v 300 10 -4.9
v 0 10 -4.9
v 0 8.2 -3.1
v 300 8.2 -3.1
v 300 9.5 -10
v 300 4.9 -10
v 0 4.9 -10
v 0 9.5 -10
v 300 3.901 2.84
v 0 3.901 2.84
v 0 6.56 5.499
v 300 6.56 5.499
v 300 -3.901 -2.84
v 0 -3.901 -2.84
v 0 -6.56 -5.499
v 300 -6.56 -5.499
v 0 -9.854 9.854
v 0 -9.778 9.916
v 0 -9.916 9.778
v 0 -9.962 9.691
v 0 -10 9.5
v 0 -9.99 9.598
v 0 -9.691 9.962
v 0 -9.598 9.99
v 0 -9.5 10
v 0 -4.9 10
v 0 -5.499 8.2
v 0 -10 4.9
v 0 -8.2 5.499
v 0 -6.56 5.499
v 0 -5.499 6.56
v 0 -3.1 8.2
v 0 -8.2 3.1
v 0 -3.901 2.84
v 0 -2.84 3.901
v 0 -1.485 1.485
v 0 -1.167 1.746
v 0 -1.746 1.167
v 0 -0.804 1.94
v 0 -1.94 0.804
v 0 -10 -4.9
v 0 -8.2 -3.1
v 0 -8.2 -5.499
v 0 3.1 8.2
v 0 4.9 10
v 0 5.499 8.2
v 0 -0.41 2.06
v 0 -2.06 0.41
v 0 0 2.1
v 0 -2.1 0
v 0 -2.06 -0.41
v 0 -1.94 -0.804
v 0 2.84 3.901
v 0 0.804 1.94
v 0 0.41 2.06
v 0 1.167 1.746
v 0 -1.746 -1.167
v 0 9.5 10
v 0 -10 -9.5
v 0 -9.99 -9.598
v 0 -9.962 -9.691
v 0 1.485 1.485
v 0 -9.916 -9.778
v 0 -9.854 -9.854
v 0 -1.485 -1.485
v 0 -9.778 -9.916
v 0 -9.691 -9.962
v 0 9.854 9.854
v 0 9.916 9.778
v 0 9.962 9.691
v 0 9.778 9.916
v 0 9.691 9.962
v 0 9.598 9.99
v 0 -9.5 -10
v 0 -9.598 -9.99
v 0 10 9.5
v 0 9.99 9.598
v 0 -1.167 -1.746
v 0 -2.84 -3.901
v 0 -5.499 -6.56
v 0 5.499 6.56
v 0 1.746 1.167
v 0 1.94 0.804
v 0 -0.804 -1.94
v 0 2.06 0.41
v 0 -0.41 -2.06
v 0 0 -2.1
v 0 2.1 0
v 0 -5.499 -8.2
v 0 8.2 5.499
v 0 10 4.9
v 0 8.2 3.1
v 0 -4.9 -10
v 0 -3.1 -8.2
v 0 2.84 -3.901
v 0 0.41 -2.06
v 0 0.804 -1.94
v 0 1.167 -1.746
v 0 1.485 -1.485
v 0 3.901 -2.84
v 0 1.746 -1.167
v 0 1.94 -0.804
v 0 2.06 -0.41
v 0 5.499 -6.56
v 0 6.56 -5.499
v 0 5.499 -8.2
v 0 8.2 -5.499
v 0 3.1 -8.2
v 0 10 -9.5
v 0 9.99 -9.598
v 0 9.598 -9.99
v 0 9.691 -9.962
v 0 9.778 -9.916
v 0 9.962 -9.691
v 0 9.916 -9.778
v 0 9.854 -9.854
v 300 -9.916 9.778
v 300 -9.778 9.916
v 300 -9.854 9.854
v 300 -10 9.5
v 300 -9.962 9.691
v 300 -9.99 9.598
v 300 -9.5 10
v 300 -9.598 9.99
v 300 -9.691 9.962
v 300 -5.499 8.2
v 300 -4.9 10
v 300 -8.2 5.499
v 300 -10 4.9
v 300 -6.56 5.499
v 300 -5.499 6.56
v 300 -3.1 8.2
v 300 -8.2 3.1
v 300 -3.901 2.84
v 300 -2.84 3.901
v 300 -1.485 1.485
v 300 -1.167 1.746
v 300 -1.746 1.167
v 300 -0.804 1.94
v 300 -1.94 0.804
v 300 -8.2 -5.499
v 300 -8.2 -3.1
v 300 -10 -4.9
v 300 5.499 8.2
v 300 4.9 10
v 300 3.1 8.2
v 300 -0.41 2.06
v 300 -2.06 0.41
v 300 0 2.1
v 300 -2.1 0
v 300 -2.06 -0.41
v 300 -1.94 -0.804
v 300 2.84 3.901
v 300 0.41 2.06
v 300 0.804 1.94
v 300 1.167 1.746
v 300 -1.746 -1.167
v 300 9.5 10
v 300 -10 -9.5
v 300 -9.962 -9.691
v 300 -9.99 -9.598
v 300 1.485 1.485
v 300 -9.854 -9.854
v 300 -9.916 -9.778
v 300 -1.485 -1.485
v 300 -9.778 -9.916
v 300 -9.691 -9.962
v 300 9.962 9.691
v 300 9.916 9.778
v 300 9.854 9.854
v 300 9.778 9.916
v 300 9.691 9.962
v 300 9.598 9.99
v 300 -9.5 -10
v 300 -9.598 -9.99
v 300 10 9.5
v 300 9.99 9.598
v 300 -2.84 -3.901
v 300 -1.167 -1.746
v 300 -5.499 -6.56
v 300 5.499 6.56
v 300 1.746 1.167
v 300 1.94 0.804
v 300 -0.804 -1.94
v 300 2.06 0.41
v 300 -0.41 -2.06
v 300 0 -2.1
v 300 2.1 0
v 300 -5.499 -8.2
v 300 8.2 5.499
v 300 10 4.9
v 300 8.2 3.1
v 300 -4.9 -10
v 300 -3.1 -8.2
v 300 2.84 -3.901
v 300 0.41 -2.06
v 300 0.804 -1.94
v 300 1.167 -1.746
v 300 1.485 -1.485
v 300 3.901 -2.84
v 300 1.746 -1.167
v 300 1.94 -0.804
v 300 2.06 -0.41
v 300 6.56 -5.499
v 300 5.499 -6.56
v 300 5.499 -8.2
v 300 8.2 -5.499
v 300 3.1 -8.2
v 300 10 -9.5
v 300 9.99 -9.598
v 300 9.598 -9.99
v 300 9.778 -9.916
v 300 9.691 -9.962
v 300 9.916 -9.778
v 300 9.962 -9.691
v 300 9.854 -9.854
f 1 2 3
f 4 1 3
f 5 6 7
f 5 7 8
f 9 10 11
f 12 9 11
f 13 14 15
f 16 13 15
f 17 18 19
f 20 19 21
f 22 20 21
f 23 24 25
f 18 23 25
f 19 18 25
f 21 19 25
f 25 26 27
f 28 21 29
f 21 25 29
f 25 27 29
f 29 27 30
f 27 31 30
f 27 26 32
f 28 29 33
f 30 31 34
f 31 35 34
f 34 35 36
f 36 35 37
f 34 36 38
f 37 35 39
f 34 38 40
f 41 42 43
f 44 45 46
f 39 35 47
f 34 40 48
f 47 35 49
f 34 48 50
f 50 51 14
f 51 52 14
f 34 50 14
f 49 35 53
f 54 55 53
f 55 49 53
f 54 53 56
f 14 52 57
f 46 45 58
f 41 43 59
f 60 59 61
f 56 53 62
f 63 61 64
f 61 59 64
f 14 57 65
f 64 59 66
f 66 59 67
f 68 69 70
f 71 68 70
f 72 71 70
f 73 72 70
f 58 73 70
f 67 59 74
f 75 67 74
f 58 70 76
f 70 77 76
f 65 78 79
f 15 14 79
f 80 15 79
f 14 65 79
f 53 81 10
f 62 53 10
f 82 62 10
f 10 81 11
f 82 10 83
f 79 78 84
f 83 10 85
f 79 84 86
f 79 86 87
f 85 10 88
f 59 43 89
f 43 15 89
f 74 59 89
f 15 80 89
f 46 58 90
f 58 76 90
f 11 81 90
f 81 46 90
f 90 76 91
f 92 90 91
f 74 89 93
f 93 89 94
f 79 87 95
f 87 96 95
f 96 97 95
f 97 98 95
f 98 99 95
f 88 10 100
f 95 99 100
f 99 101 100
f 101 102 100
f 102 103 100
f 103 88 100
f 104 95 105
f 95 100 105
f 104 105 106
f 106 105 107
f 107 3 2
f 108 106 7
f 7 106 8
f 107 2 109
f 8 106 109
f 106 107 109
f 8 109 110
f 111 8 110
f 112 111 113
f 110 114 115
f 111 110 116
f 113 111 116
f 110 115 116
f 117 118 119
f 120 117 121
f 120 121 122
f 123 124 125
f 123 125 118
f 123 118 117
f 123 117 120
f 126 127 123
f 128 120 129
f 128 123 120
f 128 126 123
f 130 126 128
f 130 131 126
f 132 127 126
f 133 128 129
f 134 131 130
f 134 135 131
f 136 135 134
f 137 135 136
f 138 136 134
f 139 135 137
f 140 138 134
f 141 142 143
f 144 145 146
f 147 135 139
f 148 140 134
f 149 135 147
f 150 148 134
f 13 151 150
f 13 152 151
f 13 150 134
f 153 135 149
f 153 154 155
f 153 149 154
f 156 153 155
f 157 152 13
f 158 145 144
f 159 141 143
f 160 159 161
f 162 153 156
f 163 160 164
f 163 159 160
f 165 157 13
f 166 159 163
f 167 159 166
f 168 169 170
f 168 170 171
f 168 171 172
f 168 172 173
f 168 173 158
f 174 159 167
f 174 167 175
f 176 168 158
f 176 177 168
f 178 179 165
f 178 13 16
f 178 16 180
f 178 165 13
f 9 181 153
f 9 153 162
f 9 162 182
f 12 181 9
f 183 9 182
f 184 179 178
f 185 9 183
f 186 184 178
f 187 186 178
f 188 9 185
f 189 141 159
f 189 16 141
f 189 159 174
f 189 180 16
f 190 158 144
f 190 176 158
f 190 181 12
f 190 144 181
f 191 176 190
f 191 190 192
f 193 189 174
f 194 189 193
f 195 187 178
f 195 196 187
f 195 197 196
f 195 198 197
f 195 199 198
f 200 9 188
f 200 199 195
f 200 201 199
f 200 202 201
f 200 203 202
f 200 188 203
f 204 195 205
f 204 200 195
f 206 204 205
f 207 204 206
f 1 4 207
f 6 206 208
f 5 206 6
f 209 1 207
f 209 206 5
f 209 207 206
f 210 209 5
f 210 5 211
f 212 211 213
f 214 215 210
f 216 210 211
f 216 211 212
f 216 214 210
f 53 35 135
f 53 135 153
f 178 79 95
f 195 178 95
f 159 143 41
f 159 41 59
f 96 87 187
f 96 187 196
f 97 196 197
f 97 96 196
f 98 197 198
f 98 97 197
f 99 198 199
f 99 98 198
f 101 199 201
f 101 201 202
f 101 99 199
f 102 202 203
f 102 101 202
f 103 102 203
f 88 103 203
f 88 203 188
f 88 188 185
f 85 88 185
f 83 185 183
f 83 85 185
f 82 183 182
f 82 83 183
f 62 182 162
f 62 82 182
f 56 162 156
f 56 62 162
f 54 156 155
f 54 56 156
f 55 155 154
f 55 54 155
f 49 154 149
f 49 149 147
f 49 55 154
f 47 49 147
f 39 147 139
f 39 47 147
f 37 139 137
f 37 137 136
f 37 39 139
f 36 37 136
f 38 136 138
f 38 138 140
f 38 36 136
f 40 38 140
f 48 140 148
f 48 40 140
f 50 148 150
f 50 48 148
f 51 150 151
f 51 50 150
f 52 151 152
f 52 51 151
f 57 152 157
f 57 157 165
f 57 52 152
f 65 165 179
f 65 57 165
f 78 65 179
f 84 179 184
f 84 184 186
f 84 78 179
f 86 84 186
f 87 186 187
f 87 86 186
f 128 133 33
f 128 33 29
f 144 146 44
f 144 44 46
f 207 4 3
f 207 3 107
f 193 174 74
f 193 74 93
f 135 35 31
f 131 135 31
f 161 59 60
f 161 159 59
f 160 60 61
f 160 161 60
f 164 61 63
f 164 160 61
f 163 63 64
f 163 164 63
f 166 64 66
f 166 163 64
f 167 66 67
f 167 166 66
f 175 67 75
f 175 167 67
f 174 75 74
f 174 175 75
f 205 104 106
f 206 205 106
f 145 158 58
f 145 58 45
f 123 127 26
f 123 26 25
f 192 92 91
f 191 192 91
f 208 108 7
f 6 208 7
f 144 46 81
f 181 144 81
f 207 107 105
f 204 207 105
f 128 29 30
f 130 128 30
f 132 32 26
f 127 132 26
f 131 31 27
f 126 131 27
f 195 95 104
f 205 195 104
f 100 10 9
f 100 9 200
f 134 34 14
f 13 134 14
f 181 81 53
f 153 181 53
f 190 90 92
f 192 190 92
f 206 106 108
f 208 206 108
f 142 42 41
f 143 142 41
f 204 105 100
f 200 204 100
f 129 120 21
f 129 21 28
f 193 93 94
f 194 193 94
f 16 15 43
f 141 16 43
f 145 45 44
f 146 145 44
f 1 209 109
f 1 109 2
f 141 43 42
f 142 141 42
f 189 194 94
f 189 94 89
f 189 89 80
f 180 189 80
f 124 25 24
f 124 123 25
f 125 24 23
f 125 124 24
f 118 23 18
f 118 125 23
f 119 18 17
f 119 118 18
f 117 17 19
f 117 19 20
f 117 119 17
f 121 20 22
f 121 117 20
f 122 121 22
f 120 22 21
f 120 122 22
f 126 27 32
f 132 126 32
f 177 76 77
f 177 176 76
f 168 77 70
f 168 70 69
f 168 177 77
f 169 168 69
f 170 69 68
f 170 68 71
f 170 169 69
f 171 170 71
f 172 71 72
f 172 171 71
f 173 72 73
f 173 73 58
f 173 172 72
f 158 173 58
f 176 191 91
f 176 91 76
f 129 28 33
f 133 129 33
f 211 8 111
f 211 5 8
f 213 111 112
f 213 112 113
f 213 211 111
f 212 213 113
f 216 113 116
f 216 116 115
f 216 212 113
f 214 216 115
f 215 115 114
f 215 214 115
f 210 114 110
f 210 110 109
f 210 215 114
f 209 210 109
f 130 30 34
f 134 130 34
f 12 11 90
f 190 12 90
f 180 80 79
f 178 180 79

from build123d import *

# Parameters (mm, degrees)
CROQUIS1_W              = 7.801320344
CROQUIS1_H              = 7.801320344
CROQUIS1_R              = 2.1
SALIENTE_EXTRUIR1_DEPTH = 300
REDONDEO1_R             = 0.5


with BuildPart() as part:
    # Croquis1 → Saliente-Extruir1 (new body)
    # profile 1 of 5: a face of its own
    with BuildSketch(Plane(origin=(0, 0, 0), x_dir=(0, 0, -1), z_dir=(1, 0, 0))):
        Polygon((-6.56, 5.499339828), (-3.900660172, 2.84), (-3.900660172, 3.900660172), (-2.84, 3.900660172), (-5.499339828, 6.56), (-5.499339828, 8.2), (-3.1, 8.2), (-4.9, 10), (-10, 10), (-10, 4.9), (-8.2, 3.1), (-8.2, 5.499339828), align=None)
    # profile 2 of 5: a face of its own
    with BuildSketch(Plane(origin=(0, 0, 0), x_dir=(0, 0, -1), z_dir=(1, 0, 0))):
        Rectangle(CROQUIS1_W, CROQUIS1_H)
        Circle(CROQUIS1_R, mode=Mode.SUBTRACT)
    # profile 3 of 5: a face of its own
    with BuildSketch(Plane(origin=(0, 0, 0), x_dir=(0, 0, -1), z_dir=(1, 0, 0))):
        Polygon((5.499339828, 6.56), (2.84, 3.900660172), (3.900660172, 3.900660172), (3.900660172, 2.84), (6.56, 5.499339828), (8.2, 5.499339828), (8.2, 3.1), (10, 4.9), (10, 10), (4.9, 10), (3.1, 8.2), (5.499339828, 8.2), align=None)
    # profile 4 of 5: a face of its own
    with BuildSketch(Plane(origin=(0, 0, 0), x_dir=(0, 0, -1), z_dir=(1, 0, 0))):
        Polygon((3.900660172, -3.900660172), (2.84, -3.900660172), (5.499339828, -6.56), (5.499339828, -8.2), (3.1, -8.2), (4.9, -10), (10, -10), (10, -4.9), (8.2, -3.1), (8.2, -5.499339828), (6.56, -5.499339828), (3.900660172, -2.84), align=None)
    # profile 5 of 5: a face of its own
    with BuildSketch(Plane(origin=(0, 0, 0), x_dir=(0, 0, -1), z_dir=(1, 0, 0))):
        Polygon((-3.900660172, -3.900660172), (-3.900660172, -2.84), (-6.56, -5.499339828), (-8.2, -5.499339828), (-8.2, -3.1), (-10, -4.9), (-10, -10), (-4.9, -10), (-3.1, -8.2), (-5.499339828, -8.2), (-5.499339828, -6.56), (-2.84, -3.900660172), align=None)
    extrude(amount=SALIENTE_EXTRUIR1_DEPTH)

    # Redondeo1
    redondeo1_edges = [part.edges().sort_by_distance(p)[0] for p in [
        (150, -10, -10),
        (150, -10, 10),
        (150, 10, 10),
        (150, 10, -10),
    ]]
    fillet(redondeo1_edges, radius=REDONDEO1_R)


solid = part.part
